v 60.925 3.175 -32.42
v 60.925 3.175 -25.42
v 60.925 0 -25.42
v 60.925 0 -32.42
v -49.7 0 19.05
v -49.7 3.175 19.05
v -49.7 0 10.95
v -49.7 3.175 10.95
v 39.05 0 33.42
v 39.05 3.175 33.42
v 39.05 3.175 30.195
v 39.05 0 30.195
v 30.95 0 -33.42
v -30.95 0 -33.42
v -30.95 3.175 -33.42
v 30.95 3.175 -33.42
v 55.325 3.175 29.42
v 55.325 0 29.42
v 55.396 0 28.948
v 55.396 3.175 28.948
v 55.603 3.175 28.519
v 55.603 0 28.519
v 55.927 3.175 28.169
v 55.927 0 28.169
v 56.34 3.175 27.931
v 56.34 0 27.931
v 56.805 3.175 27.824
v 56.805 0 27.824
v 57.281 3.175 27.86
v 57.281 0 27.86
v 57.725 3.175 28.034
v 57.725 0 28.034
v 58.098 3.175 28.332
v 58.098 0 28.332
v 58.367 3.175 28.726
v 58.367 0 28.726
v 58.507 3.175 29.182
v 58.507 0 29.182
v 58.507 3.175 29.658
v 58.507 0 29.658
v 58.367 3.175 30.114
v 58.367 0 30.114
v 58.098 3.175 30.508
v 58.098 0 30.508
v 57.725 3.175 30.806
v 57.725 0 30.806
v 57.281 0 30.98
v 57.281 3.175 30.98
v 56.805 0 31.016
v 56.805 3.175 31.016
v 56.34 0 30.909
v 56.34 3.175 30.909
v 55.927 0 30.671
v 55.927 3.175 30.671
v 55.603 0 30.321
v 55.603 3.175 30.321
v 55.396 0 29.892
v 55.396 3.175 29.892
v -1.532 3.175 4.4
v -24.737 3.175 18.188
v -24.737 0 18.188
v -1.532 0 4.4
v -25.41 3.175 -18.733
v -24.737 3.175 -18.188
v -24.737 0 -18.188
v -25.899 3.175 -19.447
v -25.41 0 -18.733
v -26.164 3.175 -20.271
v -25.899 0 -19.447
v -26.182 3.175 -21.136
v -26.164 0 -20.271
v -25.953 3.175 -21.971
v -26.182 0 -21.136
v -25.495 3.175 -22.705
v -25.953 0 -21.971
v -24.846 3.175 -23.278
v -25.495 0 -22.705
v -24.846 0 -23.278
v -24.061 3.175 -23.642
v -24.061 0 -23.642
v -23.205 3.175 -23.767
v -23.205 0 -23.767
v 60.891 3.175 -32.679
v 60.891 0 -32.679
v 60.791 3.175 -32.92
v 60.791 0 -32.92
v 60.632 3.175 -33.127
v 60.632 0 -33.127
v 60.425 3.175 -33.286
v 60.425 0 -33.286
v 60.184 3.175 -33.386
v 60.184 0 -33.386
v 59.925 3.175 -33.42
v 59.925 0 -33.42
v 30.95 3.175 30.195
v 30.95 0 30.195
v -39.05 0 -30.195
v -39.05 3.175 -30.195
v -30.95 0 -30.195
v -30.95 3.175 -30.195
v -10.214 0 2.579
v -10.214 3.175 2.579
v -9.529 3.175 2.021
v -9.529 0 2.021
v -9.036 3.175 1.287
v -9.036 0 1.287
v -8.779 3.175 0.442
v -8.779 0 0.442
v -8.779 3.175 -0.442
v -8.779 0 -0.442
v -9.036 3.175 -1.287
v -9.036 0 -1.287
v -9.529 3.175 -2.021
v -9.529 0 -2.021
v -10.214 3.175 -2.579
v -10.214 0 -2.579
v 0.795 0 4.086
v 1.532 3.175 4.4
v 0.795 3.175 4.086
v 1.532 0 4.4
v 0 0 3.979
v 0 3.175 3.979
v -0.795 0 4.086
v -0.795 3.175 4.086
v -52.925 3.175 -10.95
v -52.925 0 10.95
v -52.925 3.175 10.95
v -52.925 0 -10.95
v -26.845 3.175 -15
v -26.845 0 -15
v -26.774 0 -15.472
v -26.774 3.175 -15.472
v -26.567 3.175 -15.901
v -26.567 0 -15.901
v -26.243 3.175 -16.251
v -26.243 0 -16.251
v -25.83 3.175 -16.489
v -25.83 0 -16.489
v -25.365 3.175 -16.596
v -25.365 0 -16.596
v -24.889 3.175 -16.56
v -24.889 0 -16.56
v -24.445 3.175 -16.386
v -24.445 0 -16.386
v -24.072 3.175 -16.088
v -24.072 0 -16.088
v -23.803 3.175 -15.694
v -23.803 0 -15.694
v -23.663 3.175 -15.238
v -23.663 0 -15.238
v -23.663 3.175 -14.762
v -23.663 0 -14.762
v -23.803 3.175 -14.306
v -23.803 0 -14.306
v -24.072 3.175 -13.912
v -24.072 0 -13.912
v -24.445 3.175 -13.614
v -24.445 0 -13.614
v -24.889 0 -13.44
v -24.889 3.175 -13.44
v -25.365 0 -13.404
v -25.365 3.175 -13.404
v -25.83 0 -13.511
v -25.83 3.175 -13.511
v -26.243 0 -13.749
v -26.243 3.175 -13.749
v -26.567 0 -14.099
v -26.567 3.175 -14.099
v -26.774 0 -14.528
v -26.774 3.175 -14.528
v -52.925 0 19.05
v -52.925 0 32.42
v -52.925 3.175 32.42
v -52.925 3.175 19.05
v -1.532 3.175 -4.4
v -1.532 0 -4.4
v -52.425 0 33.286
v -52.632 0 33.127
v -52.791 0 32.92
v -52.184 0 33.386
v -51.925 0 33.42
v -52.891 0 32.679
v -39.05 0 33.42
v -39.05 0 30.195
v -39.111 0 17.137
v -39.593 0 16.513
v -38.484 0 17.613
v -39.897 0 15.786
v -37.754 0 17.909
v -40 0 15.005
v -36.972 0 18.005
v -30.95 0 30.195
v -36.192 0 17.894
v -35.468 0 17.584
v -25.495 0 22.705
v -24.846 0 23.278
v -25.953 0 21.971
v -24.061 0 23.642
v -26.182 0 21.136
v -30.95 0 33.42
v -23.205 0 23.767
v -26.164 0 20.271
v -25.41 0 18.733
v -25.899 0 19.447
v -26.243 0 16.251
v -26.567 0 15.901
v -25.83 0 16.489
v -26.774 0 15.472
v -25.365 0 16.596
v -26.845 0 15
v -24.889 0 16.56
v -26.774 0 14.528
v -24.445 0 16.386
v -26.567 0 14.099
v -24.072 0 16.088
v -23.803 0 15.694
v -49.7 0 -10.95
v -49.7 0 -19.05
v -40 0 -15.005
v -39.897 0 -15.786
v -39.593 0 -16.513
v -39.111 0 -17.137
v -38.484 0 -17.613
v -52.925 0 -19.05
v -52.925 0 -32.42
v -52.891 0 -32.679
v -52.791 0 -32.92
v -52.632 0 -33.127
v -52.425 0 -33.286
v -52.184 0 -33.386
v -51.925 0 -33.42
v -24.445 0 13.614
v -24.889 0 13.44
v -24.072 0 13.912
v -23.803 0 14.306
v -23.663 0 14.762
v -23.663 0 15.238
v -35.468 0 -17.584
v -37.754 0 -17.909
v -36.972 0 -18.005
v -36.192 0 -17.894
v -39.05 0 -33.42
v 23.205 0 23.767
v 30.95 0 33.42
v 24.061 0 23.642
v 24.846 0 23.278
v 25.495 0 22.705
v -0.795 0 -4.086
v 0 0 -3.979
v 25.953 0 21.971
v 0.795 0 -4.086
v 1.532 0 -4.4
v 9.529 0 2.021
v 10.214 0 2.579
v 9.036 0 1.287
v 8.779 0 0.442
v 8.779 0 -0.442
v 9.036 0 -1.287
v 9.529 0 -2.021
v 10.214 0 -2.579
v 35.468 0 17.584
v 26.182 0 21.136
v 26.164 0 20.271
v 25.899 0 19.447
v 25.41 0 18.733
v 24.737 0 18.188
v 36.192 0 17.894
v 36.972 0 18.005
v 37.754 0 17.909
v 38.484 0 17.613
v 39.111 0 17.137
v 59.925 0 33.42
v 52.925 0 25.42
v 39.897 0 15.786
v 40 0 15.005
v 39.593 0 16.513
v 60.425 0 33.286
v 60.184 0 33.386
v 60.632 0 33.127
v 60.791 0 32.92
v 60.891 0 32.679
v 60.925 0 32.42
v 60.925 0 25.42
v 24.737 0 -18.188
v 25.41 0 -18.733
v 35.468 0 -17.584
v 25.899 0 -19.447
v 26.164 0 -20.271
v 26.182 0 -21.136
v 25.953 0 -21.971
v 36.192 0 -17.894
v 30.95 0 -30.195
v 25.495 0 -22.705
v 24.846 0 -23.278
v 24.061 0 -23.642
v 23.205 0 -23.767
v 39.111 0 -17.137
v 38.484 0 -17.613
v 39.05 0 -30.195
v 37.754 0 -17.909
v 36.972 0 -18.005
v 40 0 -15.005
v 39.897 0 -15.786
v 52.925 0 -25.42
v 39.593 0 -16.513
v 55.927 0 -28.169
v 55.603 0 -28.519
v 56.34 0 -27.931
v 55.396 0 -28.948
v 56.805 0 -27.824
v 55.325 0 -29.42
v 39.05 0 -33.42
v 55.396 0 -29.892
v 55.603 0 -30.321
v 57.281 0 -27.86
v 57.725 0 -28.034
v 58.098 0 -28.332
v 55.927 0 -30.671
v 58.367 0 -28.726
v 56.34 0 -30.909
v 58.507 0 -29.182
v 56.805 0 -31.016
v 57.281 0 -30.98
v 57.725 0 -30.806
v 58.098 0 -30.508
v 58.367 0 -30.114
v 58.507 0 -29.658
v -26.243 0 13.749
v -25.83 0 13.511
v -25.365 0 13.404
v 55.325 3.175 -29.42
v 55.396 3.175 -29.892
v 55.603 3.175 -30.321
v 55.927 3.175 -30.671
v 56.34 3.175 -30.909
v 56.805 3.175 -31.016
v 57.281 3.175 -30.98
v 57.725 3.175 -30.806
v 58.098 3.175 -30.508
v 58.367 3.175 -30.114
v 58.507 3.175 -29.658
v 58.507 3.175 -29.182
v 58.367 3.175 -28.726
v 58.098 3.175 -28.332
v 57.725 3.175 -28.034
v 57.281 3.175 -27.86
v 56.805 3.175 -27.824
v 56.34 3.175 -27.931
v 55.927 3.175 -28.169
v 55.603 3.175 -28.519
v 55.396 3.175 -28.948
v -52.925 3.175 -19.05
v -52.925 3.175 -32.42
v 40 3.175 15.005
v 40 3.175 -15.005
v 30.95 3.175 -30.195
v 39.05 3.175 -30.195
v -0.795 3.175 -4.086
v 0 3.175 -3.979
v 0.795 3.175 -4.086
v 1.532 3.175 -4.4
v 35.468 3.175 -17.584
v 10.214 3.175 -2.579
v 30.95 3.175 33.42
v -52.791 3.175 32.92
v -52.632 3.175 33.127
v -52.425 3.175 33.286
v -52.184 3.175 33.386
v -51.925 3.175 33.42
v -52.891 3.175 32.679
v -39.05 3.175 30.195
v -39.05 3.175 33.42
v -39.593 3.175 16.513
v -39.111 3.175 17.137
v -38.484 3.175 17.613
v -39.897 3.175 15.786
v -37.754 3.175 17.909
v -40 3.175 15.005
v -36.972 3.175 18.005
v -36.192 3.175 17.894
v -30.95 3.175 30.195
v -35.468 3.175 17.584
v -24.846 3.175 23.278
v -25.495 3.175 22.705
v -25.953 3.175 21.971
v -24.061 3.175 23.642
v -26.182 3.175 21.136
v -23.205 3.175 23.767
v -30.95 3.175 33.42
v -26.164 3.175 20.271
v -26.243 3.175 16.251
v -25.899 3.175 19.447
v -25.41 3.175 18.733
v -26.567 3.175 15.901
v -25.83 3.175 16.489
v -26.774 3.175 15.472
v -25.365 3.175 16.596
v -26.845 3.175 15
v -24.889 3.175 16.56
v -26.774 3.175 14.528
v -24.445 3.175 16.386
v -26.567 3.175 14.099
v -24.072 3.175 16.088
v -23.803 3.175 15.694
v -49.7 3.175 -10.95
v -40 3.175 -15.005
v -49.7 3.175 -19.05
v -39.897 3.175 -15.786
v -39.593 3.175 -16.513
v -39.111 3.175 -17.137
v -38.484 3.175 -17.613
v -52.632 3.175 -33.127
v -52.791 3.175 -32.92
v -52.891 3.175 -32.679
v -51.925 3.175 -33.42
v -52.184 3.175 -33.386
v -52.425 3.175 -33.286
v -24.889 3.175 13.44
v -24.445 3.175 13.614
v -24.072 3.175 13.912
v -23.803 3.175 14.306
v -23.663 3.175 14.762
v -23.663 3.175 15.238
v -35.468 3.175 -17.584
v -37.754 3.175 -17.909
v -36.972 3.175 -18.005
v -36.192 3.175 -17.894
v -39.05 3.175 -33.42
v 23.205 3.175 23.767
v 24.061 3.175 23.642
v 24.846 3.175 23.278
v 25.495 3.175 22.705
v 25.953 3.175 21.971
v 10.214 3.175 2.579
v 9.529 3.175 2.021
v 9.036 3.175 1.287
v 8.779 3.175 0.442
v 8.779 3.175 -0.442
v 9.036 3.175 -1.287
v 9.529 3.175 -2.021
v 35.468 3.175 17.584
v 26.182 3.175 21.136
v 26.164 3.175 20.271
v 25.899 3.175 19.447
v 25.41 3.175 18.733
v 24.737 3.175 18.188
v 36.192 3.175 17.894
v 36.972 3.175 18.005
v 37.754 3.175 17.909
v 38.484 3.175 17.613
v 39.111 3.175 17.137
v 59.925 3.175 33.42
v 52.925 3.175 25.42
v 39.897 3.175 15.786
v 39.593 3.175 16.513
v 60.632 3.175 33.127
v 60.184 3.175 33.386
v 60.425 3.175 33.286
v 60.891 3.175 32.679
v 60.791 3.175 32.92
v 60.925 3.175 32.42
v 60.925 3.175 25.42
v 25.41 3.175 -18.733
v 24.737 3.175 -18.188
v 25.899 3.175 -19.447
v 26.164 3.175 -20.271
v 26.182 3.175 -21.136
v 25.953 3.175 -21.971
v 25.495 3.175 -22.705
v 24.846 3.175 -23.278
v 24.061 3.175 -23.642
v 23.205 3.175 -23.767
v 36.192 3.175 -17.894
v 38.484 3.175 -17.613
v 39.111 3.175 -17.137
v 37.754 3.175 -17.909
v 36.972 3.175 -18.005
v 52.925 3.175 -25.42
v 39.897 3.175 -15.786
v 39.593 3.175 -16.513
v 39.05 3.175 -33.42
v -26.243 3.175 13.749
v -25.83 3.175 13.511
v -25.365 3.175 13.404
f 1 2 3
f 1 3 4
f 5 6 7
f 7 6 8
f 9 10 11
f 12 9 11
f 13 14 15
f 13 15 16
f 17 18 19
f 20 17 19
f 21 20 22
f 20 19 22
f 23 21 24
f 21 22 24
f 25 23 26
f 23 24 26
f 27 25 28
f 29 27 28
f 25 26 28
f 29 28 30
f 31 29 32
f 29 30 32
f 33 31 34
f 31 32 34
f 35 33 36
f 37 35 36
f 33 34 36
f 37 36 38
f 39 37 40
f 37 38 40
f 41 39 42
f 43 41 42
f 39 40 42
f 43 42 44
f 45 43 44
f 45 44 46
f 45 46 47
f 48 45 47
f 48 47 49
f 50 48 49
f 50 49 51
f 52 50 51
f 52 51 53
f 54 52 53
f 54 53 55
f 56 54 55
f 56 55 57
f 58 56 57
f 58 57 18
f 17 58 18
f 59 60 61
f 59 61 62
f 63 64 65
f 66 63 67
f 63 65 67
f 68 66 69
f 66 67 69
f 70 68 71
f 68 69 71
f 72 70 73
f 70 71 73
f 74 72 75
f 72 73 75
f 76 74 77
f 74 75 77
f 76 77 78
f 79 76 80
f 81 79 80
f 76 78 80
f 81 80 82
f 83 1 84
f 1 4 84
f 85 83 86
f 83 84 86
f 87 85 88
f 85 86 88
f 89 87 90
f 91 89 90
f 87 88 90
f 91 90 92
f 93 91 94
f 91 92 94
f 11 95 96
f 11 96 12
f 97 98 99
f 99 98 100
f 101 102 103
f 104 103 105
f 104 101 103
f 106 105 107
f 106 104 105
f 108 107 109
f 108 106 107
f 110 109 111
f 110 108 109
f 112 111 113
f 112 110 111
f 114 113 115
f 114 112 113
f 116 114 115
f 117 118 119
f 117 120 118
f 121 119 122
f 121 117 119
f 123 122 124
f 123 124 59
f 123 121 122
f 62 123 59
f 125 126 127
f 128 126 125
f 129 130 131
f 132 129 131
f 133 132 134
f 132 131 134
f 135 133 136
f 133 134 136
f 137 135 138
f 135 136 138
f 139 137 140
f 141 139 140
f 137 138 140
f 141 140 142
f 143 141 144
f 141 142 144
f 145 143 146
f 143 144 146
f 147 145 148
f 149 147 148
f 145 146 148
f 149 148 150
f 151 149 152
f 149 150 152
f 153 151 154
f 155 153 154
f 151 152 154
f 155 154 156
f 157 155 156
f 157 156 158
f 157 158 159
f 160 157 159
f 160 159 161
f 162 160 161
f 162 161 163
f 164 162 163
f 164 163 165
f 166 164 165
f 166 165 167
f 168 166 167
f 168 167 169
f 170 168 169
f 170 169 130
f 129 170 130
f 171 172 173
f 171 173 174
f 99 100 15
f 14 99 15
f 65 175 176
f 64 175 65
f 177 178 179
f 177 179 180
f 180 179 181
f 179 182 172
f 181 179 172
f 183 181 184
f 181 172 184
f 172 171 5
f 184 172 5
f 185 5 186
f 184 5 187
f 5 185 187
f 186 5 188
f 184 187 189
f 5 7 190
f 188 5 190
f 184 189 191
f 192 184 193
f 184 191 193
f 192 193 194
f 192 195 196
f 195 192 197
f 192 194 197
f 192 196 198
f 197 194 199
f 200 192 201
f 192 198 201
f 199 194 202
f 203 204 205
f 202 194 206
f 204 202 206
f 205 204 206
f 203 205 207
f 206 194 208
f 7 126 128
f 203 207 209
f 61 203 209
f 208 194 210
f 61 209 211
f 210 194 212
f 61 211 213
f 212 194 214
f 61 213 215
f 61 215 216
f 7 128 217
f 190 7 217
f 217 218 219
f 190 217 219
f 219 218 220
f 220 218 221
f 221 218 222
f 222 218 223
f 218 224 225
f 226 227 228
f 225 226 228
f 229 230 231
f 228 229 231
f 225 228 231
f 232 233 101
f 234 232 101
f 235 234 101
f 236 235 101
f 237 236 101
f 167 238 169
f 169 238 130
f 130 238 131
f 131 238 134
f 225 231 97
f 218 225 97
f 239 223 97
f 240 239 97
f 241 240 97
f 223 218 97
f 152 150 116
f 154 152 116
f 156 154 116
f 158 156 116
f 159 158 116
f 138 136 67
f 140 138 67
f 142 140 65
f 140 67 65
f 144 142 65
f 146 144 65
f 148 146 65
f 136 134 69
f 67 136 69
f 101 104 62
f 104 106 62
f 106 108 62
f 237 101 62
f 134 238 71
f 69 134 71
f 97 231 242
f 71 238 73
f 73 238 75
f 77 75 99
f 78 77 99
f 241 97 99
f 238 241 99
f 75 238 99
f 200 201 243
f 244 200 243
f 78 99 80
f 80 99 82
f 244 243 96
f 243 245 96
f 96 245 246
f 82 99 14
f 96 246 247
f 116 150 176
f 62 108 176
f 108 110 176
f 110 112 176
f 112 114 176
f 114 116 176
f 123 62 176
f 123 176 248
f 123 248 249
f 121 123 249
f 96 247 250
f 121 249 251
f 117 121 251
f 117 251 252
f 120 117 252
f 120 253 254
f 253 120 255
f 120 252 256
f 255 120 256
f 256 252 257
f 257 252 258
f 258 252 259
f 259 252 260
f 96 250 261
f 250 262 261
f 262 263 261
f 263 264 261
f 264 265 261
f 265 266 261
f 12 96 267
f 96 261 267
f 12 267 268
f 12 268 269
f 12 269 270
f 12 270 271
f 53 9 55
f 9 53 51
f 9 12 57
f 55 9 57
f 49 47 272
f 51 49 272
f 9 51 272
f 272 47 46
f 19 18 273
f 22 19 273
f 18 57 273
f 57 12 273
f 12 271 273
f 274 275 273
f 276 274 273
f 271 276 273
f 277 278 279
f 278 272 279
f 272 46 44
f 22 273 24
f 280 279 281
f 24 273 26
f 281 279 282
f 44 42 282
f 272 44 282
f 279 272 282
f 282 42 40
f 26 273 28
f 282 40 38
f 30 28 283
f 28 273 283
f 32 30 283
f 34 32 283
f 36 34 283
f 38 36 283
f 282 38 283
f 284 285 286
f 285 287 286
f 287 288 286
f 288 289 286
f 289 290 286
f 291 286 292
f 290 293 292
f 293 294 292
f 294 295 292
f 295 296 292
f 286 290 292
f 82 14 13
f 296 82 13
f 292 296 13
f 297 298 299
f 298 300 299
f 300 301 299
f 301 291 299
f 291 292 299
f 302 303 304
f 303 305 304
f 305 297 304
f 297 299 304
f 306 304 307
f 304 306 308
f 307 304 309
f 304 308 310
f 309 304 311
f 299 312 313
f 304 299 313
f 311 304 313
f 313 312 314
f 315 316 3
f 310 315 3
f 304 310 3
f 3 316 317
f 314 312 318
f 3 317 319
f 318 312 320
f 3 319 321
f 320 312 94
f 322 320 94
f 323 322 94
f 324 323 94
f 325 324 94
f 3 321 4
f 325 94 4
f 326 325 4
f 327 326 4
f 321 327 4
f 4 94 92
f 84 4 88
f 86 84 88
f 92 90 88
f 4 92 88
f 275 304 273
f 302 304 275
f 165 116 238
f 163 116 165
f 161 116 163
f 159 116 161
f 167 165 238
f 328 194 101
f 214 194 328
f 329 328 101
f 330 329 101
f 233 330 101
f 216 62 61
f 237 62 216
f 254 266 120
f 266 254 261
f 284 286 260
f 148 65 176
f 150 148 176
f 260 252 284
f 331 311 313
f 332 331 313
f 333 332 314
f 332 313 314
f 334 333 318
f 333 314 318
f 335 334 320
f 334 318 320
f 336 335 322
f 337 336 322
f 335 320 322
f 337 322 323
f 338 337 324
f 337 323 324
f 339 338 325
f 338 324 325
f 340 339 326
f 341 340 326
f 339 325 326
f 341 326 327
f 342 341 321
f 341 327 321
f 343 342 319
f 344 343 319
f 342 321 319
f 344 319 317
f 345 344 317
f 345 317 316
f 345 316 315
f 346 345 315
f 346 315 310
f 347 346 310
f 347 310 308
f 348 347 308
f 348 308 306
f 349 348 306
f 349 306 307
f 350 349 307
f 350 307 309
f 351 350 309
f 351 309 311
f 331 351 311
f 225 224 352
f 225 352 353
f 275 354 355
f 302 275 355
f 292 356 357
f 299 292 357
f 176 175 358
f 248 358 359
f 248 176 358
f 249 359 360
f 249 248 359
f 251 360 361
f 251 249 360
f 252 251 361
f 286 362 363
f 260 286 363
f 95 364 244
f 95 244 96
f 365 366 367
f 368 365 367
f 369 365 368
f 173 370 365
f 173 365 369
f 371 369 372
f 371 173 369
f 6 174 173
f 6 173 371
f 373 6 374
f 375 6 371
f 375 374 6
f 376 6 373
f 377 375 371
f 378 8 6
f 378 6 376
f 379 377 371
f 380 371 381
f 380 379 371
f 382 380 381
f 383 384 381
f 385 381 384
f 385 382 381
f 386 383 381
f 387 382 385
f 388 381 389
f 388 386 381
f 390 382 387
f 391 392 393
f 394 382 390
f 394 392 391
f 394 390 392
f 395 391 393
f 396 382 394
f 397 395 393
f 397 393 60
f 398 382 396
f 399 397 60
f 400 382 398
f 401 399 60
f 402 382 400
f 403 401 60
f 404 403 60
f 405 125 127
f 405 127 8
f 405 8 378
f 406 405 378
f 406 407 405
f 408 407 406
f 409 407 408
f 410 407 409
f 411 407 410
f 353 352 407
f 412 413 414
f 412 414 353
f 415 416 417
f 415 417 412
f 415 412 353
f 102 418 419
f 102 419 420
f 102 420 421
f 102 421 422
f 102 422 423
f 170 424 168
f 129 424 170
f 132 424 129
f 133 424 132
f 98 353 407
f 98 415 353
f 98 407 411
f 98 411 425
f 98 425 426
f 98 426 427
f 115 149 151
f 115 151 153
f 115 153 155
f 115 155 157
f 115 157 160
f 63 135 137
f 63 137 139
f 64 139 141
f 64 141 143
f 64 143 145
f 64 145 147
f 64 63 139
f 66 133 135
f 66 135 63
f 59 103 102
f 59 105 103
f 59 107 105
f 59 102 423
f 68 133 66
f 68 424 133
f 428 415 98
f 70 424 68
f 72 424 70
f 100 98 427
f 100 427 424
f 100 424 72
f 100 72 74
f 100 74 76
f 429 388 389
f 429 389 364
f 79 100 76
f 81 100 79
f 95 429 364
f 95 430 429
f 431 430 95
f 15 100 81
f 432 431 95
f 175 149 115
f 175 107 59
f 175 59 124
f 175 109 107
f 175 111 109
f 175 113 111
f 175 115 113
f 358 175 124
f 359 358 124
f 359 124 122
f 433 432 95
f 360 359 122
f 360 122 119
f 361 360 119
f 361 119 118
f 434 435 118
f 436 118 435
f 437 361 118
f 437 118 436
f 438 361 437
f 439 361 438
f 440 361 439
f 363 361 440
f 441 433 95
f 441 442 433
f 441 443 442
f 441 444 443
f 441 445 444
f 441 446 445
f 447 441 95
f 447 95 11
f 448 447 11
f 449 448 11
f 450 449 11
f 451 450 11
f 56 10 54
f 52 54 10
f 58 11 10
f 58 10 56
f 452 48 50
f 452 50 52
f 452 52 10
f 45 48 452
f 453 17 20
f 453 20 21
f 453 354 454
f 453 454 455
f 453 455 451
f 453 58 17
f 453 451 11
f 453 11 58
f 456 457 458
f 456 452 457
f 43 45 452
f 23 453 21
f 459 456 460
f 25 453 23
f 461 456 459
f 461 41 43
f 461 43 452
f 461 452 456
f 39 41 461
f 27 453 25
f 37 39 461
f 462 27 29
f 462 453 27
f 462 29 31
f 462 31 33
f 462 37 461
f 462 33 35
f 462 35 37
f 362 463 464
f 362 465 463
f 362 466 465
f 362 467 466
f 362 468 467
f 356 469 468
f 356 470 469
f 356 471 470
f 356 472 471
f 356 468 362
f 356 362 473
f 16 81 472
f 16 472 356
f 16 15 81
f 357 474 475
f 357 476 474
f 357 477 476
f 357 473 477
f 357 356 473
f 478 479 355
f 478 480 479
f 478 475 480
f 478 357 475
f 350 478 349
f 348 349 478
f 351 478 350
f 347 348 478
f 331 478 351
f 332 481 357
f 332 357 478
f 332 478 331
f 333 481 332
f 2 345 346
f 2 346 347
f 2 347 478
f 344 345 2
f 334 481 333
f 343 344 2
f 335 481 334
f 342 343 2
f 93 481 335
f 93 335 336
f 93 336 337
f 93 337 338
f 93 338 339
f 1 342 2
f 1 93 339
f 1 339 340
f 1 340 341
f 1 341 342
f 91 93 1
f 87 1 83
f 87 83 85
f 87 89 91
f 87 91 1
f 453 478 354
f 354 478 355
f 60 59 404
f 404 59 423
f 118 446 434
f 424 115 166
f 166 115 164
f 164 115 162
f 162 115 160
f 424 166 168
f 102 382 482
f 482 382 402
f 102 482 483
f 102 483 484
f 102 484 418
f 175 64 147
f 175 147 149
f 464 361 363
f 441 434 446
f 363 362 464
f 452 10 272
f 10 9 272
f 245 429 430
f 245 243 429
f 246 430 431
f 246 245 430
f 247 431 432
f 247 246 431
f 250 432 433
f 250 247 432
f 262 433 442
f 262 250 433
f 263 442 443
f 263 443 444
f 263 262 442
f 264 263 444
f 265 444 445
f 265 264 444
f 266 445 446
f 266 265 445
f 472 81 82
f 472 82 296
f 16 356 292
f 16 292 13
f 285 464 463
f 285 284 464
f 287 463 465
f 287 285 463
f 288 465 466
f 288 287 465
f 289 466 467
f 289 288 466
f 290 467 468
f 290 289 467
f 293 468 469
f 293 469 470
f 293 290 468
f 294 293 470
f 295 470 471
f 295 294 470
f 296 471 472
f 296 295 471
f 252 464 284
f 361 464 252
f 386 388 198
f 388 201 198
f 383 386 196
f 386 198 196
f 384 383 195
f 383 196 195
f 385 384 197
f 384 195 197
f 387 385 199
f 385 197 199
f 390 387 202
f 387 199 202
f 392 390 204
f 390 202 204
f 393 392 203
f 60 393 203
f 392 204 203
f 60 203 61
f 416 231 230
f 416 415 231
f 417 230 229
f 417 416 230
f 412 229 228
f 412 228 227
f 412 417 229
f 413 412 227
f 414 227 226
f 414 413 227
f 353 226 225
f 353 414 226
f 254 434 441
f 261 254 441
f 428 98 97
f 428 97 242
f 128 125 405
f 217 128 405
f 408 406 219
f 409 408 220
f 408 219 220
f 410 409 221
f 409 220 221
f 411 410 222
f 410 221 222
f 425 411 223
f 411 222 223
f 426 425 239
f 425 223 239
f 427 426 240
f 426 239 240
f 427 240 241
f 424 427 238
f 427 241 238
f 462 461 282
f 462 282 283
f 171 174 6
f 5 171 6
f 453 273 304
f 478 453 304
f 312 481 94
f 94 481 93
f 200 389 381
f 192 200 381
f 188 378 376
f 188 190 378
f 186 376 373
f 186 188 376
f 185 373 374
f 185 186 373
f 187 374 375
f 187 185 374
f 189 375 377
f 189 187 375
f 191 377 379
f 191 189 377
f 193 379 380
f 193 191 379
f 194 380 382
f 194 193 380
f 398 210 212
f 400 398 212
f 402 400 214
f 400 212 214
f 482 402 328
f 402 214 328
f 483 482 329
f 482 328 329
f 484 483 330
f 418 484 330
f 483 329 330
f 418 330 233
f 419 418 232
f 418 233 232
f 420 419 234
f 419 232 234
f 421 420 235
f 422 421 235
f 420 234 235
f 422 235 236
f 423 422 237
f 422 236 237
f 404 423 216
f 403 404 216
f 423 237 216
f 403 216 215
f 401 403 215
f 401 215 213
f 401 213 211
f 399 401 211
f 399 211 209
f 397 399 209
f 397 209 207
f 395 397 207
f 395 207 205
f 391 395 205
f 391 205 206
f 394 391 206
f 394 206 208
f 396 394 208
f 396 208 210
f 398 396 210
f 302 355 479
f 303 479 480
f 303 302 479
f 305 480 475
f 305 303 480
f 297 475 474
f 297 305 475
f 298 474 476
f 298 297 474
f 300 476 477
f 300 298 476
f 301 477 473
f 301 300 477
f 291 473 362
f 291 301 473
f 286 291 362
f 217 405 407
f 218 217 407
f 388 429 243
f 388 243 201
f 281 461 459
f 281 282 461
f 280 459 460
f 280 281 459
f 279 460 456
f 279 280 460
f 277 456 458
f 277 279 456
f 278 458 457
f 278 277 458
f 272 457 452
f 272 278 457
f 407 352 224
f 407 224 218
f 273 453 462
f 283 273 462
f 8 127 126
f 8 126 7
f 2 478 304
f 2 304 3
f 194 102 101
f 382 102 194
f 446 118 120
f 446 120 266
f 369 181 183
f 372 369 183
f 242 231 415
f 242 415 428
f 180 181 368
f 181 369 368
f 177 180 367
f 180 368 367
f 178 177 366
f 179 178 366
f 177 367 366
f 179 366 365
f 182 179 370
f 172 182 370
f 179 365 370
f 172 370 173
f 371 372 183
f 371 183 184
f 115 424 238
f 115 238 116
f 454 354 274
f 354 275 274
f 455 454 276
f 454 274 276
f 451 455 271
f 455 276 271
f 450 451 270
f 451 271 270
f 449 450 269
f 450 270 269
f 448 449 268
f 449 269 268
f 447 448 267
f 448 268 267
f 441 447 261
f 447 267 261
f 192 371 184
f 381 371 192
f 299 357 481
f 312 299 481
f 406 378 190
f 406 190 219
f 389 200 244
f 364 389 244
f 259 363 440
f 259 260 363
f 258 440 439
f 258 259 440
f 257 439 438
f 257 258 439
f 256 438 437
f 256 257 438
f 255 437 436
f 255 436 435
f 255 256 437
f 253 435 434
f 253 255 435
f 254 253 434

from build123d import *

# Parameters (mm, degrees)
SKETCH1_W                = 105.85
SKETCH1_H                = 66.84
BOSS_EXTRUDE1_DEPTH      = 3.175
SKETCH2_W                = 8.1
SKETCH2_H                = 3.225
SKETCH2_W_2              = 3.225
SKETCH2_H_2              = 8.1
CUT_EXTRUDE1_DEPTH       = 63.674018939
SKETCH3_W                = 8
SKETCH3_H                = 8
BOSS_EXTRUDE2_DEPTH      = 3.175
M3_CLEARANCE_HOLE1_D     = 3.2
M3_CLEARANCE_HOLE1_DEPTH = 12
M3_CLEARANCE_HOLE1_TIP   = 0.96137699
CUT_EXTRUDE2_DEPTH       = 70.56171828
FILLET1_R                = 1
FILLET2_R                = 3


with BuildPart() as part:
    # Sketch1 → Boss-Extrude1 (new body)
    with BuildSketch(Plane(origin=(0, 0, 0), x_dir=(1, 0, 0), z_dir=(0, 1, 0))):
        Rectangle(SKETCH1_W, SKETCH1_H)
    extrude(amount=BOSS_EXTRUDE1_DEPTH)

    # Sketch2 → Cut-Extrude1 (cut, through all)
    with BuildSketch(Plane(origin=(0, 3.175, 0), x_dir=(1, 0, 0), z_dir=(0, 1, 0))):
        with Locations((-35, 31.8075)):
            Rectangle(SKETCH2_W, SKETCH2_H)
        with Locations((35, 31.8075)):
            Rectangle(SKETCH2_W, SKETCH2_H)
        with Locations((35, -31.8075)):
            Rectangle(SKETCH2_W, SKETCH2_H)
        with Locations((-35, -31.8075)):
            Rectangle(SKETCH2_W, SKETCH2_H)
        with Locations((-51.3125, -15)):
            Rectangle(SKETCH2_W_2, SKETCH2_H_2)
        with Locations((-51.3125, 15)):
            Rectangle(SKETCH2_W_2, SKETCH2_H_2)
    extrude(amount=-CUT_EXTRUDE1_DEPTH, mode=Mode.SUBTRACT)

    # Sketch3 → Boss-Extrude2 (add)
    with BuildSketch(Plane(origin=(0, 3.175, 0), x_dir=(1, 0, 0), z_dir=(0, 1, 0))):
        with Locations((56.925, 29.42)):
            Rectangle(SKETCH3_W, SKETCH3_H)
        with Locations((56.925, -29.42)):
            Rectangle(SKETCH3_W, SKETCH3_H)
    extrude(amount=-BOSS_EXTRUDE2_DEPTH)

    # M3 Clearance Hole1
    with Locations(Plane(origin=(0, 3.175, 0), x_dir=(1, 0, 0), z_dir=(0, 1, 0))):
        with Locations((56.925, 29.42), (56.925, -29.42), (-25.245, 15), (-25.245, -15)):
            Hole(M3_CLEARANCE_HOLE1_D / 2, depth=M3_CLEARANCE_HOLE1_DEPTH)
            with Locations((0, 0, -(M3_CLEARANCE_HOLE1_DEPTH + M3_CLEARANCE_HOLE1_TIP / 2))):  # 118° drill point
                Cone(0, M3_CLEARANCE_HOLE1_D / 2, M3_CLEARANCE_HOLE1_TIP, mode=Mode.SUBTRACT)

    # Sketch10 → Cut-Extrude2 (cut, through all)
    with BuildSketch(Plane(origin=(0, 3.175, 0), x_dir=(1, 0, 0), z_dir=(0, 1, 0))):
        Polygon((-34.126976843, 23.767082591), (34.126976843, 23.767082591), (0, 3.489615661), align=None)
        Polygon((-40, 20.27746693), (-5.873023157, 0), (-40, -20.27746693), align=None)
        Polygon((-34.126976843, -23.767082591), (0, -3.489615661), (34.126976843, -23.767082591), align=None)
        Polygon((40, -20.27746693), (40, 20.27746693), (5.873023157, 0), align=None)
    extrude(amount=-CUT_EXTRUDE2_DEPTH, mode=Mode.SUBTRACT)

    # Fillet1
    fillet1_edges = [part.edges().sort_by_distance(p)[0] for p in [
        (60.925, 1.5875, -33.42),
        (60.925, 1.5875, 33.42),
        (-52.925, 1.5875, 33.42),
        (-52.925, 1.5875, -33.42),
    ]]
    fillet(fillet1_edges, radius=FILLET1_R)

    # Fillet2
    fillet2_edges = [part.edges().sort_by_distance(p)[0] for p in [
        (34.126976843, 1.5875, 23.767082591),
        (-34.126976843, 1.5875, 23.767082591),
        (0, 1.5875, 3.489615661),
        (-40, 1.5875, 20.27746693),
        (-40, 1.5875, -20.27746693),
        (-5.873023157, 1.5875, 0),
        (40, 1.5875, 20.27746693),
        (5.873023157, 1.5875, 0),
        (40, 1.5875, -20.27746693),
        (0, 1.5875, -3.489615661),
        (-34.126976843, 1.5875, -23.767082591),
        (34.126976843, 1.5875, -23.767082591),
    ]]
    fillet(fillet2_edges, radius=FILLET2_R)


solid = part.part
